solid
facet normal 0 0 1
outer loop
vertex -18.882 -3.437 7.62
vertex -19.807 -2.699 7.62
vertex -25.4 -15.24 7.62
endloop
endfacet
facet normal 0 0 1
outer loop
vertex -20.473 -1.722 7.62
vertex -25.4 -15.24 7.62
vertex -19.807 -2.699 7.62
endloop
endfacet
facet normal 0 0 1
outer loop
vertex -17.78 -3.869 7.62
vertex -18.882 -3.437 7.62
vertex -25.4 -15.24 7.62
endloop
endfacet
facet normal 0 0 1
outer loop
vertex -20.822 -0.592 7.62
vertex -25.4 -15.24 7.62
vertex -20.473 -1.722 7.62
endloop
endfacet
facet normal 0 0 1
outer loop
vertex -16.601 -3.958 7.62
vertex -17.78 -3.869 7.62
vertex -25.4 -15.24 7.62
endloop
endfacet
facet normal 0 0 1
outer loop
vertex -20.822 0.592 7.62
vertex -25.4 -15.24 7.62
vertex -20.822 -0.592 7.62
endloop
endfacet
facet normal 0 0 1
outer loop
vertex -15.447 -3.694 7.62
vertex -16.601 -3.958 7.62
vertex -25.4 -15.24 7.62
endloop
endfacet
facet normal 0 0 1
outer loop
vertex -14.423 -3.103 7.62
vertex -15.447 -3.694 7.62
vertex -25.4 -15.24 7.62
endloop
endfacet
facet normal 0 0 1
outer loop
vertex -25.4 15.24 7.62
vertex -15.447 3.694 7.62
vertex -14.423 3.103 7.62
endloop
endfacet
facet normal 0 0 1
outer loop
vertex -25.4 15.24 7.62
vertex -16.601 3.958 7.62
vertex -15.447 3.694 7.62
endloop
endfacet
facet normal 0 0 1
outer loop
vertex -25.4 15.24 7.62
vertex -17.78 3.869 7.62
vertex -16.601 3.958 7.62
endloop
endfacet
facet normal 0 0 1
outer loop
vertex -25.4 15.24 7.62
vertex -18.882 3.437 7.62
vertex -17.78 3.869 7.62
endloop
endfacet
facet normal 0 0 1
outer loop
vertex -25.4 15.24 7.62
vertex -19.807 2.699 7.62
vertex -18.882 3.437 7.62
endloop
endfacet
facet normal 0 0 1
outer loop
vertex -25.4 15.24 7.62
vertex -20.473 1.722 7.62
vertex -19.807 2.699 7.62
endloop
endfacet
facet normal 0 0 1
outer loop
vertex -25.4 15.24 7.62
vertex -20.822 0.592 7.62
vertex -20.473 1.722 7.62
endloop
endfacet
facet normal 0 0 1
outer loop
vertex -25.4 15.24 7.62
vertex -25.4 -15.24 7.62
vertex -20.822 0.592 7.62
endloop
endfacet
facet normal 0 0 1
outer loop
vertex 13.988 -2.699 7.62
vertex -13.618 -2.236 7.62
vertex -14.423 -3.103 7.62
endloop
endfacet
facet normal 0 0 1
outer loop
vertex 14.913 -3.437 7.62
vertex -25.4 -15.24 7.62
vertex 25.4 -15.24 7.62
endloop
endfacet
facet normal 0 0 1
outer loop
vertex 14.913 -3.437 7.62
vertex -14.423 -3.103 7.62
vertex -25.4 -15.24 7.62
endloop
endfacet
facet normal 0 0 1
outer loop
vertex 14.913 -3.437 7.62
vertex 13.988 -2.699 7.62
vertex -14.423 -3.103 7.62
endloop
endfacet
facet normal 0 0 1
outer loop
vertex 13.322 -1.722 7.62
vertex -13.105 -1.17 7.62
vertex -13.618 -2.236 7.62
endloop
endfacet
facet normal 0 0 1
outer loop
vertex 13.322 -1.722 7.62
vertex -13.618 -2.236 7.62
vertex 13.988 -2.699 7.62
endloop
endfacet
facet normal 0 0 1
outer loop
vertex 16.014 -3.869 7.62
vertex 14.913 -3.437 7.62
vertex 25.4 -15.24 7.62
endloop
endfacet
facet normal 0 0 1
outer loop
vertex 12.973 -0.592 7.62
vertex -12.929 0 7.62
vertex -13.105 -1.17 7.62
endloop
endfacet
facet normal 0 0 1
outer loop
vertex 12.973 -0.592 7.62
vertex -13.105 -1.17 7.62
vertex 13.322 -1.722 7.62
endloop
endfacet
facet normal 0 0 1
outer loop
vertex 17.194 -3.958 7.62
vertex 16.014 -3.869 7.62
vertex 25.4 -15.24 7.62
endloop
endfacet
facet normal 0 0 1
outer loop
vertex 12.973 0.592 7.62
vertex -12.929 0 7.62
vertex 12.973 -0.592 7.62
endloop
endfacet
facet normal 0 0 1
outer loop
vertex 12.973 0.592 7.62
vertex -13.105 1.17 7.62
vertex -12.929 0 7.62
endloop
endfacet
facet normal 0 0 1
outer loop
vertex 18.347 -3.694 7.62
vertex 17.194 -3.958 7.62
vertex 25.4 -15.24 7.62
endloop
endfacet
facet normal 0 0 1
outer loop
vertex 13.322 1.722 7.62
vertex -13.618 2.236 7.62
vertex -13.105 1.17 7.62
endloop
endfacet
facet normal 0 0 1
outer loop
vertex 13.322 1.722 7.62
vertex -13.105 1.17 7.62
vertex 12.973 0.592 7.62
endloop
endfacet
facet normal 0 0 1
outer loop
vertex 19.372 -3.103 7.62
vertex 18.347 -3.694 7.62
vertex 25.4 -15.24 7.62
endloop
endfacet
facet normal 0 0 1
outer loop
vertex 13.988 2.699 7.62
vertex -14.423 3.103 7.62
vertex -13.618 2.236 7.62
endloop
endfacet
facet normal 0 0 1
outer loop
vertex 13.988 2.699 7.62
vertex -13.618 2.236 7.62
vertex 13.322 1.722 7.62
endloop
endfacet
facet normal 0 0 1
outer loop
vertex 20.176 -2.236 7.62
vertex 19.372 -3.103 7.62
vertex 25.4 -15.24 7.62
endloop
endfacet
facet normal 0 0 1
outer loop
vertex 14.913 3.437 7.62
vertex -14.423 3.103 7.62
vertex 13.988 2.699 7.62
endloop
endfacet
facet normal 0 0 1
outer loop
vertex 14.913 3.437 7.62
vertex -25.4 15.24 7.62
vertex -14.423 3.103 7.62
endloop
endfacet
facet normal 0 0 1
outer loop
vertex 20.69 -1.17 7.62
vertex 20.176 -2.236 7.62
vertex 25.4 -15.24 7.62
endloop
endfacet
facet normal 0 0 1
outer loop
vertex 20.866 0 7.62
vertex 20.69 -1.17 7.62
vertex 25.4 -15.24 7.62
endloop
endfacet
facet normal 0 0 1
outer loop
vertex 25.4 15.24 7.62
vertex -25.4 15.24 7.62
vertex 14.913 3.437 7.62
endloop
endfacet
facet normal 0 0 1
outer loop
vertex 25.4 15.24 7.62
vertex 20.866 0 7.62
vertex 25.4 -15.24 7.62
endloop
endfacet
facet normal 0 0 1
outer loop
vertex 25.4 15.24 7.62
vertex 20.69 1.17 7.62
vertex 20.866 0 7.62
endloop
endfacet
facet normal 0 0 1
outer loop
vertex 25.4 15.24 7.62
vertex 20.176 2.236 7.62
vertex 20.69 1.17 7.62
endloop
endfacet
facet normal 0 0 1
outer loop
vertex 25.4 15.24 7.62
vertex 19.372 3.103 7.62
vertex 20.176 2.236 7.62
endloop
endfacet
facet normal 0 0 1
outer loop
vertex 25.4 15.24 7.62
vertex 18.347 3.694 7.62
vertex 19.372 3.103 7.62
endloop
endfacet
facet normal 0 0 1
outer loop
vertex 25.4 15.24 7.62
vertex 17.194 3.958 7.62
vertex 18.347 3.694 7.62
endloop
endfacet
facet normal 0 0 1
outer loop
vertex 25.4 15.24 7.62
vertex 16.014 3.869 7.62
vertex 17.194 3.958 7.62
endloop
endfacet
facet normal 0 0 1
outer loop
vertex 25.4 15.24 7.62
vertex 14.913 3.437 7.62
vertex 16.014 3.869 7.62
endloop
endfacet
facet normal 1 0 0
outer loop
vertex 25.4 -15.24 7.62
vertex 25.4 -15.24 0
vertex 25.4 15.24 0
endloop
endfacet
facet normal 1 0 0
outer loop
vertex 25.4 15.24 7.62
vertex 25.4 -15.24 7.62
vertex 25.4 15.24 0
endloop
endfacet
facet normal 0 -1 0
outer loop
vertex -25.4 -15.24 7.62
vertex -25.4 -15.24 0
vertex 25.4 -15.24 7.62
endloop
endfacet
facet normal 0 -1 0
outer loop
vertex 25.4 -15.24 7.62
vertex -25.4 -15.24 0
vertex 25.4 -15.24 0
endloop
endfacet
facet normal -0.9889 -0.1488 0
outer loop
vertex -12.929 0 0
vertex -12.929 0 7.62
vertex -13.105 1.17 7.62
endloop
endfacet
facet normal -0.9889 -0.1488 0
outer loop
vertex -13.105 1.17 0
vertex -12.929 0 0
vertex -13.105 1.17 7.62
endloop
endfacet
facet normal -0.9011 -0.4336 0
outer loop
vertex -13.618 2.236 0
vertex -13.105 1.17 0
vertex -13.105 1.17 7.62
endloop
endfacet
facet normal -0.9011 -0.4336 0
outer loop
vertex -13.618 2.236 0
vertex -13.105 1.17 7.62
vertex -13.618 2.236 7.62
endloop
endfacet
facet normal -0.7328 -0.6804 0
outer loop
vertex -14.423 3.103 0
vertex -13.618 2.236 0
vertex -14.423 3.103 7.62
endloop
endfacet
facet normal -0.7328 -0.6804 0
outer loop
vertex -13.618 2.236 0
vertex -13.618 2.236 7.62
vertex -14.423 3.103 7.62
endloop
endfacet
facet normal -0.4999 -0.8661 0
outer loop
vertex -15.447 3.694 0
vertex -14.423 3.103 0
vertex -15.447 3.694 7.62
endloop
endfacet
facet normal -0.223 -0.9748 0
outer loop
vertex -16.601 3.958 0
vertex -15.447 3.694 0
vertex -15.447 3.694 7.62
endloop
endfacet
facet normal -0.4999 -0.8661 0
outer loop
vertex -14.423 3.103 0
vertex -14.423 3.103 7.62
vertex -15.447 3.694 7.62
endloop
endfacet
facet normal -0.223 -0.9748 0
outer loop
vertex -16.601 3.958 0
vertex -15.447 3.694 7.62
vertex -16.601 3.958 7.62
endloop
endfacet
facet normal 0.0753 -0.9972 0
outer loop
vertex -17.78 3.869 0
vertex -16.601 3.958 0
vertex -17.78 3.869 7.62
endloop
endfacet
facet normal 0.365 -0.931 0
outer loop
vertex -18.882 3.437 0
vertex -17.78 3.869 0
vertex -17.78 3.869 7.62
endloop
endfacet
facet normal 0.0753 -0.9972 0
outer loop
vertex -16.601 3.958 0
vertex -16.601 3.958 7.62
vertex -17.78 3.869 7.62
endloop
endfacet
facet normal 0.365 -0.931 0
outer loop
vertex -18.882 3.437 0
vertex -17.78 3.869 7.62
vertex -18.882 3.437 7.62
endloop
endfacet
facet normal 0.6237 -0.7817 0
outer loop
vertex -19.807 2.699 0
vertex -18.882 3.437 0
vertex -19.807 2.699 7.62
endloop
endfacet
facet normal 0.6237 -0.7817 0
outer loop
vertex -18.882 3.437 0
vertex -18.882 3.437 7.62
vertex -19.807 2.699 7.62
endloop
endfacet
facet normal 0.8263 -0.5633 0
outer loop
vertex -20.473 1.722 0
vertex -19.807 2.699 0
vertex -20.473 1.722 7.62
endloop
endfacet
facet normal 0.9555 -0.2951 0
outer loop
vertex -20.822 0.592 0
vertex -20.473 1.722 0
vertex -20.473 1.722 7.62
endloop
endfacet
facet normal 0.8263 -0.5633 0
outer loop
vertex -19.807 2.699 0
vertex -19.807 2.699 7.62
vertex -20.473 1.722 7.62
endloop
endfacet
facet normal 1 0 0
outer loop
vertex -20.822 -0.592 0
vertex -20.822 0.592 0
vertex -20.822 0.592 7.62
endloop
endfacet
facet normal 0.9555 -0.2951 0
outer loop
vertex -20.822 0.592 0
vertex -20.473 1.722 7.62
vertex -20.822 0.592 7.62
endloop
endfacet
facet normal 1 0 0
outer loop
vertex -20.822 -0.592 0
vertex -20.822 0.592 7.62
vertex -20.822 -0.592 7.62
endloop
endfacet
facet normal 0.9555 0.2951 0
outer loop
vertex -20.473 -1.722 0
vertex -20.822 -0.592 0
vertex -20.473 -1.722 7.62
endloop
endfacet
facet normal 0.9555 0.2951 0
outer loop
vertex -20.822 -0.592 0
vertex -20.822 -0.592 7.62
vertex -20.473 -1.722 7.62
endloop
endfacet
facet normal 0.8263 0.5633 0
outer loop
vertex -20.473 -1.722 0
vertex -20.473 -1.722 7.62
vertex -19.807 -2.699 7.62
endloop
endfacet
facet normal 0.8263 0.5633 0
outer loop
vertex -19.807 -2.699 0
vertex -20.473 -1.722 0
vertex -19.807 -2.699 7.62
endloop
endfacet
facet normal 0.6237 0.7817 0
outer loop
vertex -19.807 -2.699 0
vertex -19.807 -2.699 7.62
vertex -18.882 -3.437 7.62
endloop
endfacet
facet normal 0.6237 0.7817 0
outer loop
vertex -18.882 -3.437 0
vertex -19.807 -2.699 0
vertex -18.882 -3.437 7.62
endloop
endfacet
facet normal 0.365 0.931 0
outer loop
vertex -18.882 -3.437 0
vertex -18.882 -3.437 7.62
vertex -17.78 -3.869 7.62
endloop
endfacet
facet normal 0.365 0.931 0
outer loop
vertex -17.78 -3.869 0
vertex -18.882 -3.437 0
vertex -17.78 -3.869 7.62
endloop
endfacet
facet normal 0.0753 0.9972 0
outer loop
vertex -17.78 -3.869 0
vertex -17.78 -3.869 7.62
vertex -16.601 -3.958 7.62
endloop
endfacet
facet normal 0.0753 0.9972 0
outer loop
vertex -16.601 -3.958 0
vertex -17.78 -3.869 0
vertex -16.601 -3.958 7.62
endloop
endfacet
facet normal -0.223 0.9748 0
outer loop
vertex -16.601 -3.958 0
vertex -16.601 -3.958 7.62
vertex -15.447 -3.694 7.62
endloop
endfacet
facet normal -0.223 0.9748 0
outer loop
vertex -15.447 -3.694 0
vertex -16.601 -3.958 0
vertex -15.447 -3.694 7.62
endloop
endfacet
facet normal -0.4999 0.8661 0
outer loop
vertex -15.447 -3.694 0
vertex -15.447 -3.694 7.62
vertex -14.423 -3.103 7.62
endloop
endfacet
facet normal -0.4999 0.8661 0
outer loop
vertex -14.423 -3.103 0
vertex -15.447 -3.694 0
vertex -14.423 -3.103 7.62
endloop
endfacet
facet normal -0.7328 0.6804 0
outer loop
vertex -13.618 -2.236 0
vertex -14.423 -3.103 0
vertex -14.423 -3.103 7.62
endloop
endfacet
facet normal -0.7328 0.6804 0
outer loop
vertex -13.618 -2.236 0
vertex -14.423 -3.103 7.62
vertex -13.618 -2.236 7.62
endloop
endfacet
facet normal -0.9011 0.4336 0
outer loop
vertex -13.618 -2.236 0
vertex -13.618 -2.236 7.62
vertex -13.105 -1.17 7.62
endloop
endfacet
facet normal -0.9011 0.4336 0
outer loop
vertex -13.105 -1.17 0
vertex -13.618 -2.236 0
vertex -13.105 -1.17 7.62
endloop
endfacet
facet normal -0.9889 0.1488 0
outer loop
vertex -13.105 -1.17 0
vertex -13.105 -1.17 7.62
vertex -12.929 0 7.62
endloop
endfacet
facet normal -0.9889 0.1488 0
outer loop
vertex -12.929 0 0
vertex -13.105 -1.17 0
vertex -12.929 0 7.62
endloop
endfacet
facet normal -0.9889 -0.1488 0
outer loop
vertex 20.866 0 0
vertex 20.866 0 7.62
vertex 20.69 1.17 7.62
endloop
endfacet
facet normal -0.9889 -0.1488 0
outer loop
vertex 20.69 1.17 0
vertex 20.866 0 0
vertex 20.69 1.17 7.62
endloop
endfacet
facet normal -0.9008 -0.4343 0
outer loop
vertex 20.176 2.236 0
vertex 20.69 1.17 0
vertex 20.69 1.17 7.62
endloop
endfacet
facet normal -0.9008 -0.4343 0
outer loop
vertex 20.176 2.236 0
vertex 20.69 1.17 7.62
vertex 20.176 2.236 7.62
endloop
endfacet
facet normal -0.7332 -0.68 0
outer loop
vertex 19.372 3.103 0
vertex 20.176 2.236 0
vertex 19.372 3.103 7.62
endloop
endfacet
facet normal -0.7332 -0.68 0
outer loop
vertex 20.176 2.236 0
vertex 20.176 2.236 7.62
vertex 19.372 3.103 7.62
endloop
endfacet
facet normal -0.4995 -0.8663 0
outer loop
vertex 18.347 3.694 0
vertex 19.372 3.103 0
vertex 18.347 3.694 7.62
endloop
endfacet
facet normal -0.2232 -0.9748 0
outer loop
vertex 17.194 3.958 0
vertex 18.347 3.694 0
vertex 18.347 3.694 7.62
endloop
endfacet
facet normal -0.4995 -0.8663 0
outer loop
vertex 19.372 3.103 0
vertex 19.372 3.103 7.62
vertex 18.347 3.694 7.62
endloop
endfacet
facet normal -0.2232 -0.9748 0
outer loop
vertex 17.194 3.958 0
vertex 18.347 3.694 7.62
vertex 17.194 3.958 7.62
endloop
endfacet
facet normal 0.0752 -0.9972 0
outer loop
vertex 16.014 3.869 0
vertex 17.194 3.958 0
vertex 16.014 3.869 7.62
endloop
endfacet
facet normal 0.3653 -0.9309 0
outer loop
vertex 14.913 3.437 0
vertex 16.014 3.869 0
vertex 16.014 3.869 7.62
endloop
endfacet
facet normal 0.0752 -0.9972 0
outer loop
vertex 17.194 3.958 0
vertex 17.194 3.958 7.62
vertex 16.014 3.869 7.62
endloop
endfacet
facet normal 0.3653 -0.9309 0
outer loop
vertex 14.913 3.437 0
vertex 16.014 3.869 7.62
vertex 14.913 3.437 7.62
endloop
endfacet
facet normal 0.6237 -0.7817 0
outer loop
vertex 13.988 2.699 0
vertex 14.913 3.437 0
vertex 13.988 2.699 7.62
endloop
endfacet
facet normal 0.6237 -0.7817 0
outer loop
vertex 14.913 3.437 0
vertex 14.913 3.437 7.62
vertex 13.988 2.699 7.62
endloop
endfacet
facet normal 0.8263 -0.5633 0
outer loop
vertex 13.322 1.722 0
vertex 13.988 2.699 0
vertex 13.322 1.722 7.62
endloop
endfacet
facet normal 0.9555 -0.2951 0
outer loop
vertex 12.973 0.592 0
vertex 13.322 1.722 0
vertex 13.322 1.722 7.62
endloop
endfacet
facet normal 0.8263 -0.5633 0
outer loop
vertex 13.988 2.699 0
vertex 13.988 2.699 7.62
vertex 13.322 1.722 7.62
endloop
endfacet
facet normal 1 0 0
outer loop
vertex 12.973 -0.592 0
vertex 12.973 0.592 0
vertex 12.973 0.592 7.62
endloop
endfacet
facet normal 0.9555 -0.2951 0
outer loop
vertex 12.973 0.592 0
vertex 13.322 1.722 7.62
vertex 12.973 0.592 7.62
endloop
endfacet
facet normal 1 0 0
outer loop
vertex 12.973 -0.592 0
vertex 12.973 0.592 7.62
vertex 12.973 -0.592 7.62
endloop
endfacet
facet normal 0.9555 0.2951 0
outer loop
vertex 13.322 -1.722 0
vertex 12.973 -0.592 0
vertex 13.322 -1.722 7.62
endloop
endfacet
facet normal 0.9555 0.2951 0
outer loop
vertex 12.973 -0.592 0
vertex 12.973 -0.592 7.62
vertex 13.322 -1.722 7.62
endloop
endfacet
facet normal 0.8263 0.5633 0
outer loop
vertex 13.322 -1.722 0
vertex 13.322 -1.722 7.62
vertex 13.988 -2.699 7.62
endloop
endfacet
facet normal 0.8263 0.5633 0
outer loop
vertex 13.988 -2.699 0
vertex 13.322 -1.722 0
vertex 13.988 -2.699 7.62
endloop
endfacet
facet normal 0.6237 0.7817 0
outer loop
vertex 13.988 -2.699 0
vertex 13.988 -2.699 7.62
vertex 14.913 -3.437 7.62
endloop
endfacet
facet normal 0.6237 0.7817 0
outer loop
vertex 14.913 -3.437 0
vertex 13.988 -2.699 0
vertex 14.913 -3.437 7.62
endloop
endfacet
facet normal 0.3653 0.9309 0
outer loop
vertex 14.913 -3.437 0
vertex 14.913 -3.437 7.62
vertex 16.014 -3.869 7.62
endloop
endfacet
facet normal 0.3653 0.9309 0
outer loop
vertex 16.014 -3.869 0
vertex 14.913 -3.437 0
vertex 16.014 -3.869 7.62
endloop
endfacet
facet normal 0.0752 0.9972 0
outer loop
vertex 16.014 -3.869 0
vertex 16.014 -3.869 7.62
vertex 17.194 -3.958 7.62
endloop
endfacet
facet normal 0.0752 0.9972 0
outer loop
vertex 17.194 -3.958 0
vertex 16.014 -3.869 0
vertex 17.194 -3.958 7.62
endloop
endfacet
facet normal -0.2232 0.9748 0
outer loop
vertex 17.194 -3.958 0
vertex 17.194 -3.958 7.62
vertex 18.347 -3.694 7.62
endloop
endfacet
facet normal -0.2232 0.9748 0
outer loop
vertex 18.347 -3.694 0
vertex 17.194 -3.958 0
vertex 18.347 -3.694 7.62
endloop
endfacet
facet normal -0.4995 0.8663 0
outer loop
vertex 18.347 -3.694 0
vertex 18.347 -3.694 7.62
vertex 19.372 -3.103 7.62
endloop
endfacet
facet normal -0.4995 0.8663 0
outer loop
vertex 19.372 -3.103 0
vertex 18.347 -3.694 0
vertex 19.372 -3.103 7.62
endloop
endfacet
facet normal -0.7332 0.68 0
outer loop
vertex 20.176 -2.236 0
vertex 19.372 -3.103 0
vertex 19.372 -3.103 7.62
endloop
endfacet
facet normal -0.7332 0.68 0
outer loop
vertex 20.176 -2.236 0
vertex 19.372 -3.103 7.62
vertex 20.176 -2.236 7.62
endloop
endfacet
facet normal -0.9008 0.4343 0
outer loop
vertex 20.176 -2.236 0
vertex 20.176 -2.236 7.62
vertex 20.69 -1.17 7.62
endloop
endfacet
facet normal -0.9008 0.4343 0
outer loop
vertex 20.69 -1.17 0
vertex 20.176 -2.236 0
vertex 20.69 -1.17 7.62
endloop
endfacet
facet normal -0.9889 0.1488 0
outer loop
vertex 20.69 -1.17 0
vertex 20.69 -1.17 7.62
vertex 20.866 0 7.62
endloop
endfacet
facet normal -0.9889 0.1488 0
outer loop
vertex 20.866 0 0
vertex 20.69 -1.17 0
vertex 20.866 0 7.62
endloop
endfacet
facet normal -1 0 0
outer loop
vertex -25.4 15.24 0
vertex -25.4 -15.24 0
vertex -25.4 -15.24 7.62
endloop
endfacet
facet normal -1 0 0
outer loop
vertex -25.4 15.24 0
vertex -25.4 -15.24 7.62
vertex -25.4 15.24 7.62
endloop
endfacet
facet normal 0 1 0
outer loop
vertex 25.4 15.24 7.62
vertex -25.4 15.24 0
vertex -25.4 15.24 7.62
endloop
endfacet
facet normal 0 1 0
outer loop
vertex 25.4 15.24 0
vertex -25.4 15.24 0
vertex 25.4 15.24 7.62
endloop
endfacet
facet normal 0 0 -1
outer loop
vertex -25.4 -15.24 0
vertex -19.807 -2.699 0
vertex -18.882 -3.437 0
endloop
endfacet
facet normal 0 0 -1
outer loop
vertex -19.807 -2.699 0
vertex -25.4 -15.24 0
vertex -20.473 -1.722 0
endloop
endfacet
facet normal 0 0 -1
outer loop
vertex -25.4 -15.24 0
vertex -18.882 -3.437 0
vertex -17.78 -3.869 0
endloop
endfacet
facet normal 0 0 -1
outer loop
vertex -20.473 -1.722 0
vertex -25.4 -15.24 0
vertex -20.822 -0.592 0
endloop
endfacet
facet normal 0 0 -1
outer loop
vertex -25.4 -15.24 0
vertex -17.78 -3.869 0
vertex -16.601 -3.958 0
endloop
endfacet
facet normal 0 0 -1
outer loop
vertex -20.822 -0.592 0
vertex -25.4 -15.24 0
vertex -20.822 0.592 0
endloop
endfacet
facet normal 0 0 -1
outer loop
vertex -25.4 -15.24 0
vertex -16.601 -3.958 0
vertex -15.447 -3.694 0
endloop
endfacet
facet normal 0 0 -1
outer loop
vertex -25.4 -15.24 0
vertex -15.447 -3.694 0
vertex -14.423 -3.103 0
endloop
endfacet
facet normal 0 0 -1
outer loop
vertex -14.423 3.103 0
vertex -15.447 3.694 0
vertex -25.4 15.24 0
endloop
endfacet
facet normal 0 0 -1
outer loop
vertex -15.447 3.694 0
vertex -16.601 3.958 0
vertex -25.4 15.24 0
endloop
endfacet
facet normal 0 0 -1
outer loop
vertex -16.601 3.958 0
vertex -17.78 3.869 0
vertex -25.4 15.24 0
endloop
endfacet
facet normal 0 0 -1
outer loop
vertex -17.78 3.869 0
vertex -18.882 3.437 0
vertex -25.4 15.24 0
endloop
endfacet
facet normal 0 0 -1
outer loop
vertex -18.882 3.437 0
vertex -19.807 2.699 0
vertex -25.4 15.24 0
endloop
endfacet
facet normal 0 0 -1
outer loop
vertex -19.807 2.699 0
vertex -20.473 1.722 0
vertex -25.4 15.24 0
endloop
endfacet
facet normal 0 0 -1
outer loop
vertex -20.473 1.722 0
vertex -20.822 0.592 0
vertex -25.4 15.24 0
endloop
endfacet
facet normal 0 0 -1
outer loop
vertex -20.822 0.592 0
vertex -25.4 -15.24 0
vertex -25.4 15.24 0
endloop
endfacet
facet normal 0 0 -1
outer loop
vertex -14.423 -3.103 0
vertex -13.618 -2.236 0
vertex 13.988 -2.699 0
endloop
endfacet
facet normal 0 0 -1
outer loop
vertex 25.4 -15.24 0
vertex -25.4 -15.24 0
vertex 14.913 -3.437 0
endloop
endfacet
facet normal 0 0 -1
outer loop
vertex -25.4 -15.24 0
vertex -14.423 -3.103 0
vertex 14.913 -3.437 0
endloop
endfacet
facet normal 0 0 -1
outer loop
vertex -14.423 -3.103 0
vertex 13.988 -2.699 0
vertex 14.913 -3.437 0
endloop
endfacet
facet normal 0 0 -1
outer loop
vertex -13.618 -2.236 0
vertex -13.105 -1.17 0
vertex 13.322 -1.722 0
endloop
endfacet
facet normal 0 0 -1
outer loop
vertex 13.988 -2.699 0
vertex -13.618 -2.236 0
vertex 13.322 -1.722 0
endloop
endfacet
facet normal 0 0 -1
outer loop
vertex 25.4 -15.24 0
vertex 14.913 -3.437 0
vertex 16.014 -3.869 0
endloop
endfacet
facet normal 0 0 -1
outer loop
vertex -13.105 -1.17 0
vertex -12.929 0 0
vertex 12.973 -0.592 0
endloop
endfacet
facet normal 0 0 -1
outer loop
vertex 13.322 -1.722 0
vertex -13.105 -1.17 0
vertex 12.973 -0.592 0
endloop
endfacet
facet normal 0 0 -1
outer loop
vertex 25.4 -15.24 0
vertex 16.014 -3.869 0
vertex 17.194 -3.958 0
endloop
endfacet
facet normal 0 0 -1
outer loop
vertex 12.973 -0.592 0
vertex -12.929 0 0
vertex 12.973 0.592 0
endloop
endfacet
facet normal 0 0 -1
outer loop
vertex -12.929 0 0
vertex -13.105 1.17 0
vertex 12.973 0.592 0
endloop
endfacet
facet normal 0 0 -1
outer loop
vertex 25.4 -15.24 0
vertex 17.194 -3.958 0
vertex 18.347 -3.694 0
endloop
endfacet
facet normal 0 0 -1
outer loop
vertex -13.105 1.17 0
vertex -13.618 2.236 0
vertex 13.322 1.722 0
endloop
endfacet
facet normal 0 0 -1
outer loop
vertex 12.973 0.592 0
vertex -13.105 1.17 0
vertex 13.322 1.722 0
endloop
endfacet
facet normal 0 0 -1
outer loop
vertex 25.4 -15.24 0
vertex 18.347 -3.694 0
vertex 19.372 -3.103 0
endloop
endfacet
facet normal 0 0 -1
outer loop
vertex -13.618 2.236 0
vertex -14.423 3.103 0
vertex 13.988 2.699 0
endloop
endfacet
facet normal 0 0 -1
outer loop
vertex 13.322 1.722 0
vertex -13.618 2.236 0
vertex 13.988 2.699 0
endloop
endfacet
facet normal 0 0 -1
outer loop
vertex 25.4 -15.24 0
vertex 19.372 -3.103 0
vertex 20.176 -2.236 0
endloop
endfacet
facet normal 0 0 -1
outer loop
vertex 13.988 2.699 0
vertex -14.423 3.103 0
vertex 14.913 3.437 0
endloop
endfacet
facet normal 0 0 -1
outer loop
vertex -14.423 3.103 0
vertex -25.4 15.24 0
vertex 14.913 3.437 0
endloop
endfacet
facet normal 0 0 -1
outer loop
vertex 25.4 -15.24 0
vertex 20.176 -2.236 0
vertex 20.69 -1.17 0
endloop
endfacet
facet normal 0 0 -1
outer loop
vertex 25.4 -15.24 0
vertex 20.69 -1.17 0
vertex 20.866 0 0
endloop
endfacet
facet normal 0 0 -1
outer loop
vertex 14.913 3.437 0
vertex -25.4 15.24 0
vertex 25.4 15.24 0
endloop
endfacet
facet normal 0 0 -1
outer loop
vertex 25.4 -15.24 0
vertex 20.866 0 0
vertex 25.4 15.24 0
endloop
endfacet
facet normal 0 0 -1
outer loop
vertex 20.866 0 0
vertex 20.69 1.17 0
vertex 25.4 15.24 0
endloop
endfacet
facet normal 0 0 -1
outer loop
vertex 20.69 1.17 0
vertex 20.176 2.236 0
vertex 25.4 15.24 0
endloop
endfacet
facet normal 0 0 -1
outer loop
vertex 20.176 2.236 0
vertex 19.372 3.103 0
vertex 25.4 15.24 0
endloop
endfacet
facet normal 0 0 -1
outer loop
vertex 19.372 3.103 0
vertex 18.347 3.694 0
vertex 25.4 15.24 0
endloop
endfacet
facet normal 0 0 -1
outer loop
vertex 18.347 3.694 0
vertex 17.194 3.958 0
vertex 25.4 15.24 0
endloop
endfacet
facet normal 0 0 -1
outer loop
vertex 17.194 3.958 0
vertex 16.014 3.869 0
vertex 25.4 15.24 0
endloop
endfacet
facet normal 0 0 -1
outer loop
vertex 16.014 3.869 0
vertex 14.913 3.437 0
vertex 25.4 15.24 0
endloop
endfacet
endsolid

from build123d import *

# Parameters (mm, degrees)
F0_W     = 50.8
F0_H     = 30.48
F1_DEPTH = 7.62
F2_R     = 3.96875
F3_DEPTH = 25.4


with BuildPart() as f1:
    # F0 (on Top) → F1 (new body)
    with BuildSketch(Plane.XY):
        Rectangle(F0_W, F0_H)
    extrude(amount=F1_DEPTH)

    # F2 (on face) → F3 (cut)
    with BuildSketch(Plane.XY.offset(7.62)):
        with BuildLine():
            ThreePointArc((-20.8661, 0), (-16.89735, -3.96875), (-12.9286, 0))
            ThreePointArc((-12.9286, 0), (-16.89735, 3.96875), (-20.8661, 0))
        make_face()
        with Locations((16.89735, 0)):
            Circle(F2_R)
    extrude(amount=-F3_DEPTH, mode=Mode.SUBTRACT)


solid = f1.part
